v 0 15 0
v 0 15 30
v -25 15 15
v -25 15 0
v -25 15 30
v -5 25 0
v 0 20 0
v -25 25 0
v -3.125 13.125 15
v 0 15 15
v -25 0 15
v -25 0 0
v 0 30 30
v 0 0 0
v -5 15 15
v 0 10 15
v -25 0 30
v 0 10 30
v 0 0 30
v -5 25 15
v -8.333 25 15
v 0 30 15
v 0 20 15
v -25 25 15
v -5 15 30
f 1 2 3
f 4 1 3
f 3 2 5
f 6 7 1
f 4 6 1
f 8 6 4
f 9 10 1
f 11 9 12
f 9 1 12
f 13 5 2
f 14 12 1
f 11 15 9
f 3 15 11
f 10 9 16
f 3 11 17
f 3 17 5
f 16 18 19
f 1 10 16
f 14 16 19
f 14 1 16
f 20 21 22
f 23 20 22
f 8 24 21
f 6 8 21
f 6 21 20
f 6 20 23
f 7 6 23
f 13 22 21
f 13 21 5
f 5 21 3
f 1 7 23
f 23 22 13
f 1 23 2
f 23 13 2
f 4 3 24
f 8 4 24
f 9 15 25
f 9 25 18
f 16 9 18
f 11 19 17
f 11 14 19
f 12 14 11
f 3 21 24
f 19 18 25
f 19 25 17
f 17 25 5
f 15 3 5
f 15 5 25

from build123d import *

# Parameters (mm, degrees)
BOSS_EXTRUDE1_DEPTH = 15
BOSS_EXTRUDE2_DEPTH = 15
BOSS_EXTRUDE4_DEPTH = 15
BOSS_EXTRUDE5_DEPTH = 15


with BuildPart() as part:
    # Sketch1 → Boss-Extrude1 (new body)
    with BuildSketch(Plane.XY):
        Polygon((-25, 0), (0, 0), (0, 15), align=None)
    extrude(amount=BOSS_EXTRUDE1_DEPTH)

    # Sketch2 → Boss-Extrude2 (add)
    with BuildSketch(Plane.XY.offset(15)):
        Polygon((-25, 0), (-25, 15), (-5, 15), (0, 10), (0, 0), align=None)
    extrude(amount=BOSS_EXTRUDE2_DEPTH)


with BuildPart() as body_2:
    # Sketch3 → Boss-Extrude4 (new body)
    with BuildSketch(Plane.XY.offset(15)):
        Polygon((-25, 15), (0, 15), (0, 30), align=None)
    extrude(amount=BOSS_EXTRUDE4_DEPTH)

    # Sketch5 → Boss-Extrude5 (add)
    with BuildSketch(Plane(origin=(0, 0, 15), x_dir=(-1, 0, 0), z_dir=(0, 0, -1))):
        Polygon((25, 15), (25, 25), (5, 25), (0, 20), (0, 15), align=None)
    extrude(amount=BOSS_EXTRUDE5_DEPTH)


solid = Compound([part.part, body_2.part])
